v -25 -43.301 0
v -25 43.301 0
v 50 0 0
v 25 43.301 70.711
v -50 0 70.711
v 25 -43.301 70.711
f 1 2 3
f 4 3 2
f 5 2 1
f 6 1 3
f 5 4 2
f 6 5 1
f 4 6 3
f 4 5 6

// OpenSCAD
r = 50;

x0 = r * cos(0);
y0 = r * sin(0);

x1 = r * cos(120);
y1 = r * sin(120);

x2 = r * cos(-120);
y2 = r * sin(-120);

xa0 = r * cos(60);
ya0 = r * sin(60);

xa1 = r * cos(180);
ya1 = r * sin(180);

xa2 = r * cos(-60);
ya2 = r * sin(-60);

Lsq = (x1 - x2) * (x1 - x2) + (y1 - y2) * (y1 - y2);
sqsq = (x1 - xa1) * (x1 - xa1) + (y1 - ya1) * (y1 - ya1);
// Lsq = h * h + (x1 - xa1) * (x1 - xa1) + (y1 - ya1) * (y1 - ya1)
h = sqrt(Lsq - sqsq);

polyhedron(
    points = [
        [x0, y0, 0],
        [x1, y1, 0],
        [x2, y2, 0],
        [xa0, ya0, h],
        [xa1, ya1, h],
        [xa2, ya2, h]],
    faces = [
        [0, 1, 2],
        [1, 0, 3],
        [2, 1, 4],
        [0, 2, 5],
        [1, 3, 4],
        [2, 4, 5],
        [0, 5, 3],
        [5, 4, 3]]);
